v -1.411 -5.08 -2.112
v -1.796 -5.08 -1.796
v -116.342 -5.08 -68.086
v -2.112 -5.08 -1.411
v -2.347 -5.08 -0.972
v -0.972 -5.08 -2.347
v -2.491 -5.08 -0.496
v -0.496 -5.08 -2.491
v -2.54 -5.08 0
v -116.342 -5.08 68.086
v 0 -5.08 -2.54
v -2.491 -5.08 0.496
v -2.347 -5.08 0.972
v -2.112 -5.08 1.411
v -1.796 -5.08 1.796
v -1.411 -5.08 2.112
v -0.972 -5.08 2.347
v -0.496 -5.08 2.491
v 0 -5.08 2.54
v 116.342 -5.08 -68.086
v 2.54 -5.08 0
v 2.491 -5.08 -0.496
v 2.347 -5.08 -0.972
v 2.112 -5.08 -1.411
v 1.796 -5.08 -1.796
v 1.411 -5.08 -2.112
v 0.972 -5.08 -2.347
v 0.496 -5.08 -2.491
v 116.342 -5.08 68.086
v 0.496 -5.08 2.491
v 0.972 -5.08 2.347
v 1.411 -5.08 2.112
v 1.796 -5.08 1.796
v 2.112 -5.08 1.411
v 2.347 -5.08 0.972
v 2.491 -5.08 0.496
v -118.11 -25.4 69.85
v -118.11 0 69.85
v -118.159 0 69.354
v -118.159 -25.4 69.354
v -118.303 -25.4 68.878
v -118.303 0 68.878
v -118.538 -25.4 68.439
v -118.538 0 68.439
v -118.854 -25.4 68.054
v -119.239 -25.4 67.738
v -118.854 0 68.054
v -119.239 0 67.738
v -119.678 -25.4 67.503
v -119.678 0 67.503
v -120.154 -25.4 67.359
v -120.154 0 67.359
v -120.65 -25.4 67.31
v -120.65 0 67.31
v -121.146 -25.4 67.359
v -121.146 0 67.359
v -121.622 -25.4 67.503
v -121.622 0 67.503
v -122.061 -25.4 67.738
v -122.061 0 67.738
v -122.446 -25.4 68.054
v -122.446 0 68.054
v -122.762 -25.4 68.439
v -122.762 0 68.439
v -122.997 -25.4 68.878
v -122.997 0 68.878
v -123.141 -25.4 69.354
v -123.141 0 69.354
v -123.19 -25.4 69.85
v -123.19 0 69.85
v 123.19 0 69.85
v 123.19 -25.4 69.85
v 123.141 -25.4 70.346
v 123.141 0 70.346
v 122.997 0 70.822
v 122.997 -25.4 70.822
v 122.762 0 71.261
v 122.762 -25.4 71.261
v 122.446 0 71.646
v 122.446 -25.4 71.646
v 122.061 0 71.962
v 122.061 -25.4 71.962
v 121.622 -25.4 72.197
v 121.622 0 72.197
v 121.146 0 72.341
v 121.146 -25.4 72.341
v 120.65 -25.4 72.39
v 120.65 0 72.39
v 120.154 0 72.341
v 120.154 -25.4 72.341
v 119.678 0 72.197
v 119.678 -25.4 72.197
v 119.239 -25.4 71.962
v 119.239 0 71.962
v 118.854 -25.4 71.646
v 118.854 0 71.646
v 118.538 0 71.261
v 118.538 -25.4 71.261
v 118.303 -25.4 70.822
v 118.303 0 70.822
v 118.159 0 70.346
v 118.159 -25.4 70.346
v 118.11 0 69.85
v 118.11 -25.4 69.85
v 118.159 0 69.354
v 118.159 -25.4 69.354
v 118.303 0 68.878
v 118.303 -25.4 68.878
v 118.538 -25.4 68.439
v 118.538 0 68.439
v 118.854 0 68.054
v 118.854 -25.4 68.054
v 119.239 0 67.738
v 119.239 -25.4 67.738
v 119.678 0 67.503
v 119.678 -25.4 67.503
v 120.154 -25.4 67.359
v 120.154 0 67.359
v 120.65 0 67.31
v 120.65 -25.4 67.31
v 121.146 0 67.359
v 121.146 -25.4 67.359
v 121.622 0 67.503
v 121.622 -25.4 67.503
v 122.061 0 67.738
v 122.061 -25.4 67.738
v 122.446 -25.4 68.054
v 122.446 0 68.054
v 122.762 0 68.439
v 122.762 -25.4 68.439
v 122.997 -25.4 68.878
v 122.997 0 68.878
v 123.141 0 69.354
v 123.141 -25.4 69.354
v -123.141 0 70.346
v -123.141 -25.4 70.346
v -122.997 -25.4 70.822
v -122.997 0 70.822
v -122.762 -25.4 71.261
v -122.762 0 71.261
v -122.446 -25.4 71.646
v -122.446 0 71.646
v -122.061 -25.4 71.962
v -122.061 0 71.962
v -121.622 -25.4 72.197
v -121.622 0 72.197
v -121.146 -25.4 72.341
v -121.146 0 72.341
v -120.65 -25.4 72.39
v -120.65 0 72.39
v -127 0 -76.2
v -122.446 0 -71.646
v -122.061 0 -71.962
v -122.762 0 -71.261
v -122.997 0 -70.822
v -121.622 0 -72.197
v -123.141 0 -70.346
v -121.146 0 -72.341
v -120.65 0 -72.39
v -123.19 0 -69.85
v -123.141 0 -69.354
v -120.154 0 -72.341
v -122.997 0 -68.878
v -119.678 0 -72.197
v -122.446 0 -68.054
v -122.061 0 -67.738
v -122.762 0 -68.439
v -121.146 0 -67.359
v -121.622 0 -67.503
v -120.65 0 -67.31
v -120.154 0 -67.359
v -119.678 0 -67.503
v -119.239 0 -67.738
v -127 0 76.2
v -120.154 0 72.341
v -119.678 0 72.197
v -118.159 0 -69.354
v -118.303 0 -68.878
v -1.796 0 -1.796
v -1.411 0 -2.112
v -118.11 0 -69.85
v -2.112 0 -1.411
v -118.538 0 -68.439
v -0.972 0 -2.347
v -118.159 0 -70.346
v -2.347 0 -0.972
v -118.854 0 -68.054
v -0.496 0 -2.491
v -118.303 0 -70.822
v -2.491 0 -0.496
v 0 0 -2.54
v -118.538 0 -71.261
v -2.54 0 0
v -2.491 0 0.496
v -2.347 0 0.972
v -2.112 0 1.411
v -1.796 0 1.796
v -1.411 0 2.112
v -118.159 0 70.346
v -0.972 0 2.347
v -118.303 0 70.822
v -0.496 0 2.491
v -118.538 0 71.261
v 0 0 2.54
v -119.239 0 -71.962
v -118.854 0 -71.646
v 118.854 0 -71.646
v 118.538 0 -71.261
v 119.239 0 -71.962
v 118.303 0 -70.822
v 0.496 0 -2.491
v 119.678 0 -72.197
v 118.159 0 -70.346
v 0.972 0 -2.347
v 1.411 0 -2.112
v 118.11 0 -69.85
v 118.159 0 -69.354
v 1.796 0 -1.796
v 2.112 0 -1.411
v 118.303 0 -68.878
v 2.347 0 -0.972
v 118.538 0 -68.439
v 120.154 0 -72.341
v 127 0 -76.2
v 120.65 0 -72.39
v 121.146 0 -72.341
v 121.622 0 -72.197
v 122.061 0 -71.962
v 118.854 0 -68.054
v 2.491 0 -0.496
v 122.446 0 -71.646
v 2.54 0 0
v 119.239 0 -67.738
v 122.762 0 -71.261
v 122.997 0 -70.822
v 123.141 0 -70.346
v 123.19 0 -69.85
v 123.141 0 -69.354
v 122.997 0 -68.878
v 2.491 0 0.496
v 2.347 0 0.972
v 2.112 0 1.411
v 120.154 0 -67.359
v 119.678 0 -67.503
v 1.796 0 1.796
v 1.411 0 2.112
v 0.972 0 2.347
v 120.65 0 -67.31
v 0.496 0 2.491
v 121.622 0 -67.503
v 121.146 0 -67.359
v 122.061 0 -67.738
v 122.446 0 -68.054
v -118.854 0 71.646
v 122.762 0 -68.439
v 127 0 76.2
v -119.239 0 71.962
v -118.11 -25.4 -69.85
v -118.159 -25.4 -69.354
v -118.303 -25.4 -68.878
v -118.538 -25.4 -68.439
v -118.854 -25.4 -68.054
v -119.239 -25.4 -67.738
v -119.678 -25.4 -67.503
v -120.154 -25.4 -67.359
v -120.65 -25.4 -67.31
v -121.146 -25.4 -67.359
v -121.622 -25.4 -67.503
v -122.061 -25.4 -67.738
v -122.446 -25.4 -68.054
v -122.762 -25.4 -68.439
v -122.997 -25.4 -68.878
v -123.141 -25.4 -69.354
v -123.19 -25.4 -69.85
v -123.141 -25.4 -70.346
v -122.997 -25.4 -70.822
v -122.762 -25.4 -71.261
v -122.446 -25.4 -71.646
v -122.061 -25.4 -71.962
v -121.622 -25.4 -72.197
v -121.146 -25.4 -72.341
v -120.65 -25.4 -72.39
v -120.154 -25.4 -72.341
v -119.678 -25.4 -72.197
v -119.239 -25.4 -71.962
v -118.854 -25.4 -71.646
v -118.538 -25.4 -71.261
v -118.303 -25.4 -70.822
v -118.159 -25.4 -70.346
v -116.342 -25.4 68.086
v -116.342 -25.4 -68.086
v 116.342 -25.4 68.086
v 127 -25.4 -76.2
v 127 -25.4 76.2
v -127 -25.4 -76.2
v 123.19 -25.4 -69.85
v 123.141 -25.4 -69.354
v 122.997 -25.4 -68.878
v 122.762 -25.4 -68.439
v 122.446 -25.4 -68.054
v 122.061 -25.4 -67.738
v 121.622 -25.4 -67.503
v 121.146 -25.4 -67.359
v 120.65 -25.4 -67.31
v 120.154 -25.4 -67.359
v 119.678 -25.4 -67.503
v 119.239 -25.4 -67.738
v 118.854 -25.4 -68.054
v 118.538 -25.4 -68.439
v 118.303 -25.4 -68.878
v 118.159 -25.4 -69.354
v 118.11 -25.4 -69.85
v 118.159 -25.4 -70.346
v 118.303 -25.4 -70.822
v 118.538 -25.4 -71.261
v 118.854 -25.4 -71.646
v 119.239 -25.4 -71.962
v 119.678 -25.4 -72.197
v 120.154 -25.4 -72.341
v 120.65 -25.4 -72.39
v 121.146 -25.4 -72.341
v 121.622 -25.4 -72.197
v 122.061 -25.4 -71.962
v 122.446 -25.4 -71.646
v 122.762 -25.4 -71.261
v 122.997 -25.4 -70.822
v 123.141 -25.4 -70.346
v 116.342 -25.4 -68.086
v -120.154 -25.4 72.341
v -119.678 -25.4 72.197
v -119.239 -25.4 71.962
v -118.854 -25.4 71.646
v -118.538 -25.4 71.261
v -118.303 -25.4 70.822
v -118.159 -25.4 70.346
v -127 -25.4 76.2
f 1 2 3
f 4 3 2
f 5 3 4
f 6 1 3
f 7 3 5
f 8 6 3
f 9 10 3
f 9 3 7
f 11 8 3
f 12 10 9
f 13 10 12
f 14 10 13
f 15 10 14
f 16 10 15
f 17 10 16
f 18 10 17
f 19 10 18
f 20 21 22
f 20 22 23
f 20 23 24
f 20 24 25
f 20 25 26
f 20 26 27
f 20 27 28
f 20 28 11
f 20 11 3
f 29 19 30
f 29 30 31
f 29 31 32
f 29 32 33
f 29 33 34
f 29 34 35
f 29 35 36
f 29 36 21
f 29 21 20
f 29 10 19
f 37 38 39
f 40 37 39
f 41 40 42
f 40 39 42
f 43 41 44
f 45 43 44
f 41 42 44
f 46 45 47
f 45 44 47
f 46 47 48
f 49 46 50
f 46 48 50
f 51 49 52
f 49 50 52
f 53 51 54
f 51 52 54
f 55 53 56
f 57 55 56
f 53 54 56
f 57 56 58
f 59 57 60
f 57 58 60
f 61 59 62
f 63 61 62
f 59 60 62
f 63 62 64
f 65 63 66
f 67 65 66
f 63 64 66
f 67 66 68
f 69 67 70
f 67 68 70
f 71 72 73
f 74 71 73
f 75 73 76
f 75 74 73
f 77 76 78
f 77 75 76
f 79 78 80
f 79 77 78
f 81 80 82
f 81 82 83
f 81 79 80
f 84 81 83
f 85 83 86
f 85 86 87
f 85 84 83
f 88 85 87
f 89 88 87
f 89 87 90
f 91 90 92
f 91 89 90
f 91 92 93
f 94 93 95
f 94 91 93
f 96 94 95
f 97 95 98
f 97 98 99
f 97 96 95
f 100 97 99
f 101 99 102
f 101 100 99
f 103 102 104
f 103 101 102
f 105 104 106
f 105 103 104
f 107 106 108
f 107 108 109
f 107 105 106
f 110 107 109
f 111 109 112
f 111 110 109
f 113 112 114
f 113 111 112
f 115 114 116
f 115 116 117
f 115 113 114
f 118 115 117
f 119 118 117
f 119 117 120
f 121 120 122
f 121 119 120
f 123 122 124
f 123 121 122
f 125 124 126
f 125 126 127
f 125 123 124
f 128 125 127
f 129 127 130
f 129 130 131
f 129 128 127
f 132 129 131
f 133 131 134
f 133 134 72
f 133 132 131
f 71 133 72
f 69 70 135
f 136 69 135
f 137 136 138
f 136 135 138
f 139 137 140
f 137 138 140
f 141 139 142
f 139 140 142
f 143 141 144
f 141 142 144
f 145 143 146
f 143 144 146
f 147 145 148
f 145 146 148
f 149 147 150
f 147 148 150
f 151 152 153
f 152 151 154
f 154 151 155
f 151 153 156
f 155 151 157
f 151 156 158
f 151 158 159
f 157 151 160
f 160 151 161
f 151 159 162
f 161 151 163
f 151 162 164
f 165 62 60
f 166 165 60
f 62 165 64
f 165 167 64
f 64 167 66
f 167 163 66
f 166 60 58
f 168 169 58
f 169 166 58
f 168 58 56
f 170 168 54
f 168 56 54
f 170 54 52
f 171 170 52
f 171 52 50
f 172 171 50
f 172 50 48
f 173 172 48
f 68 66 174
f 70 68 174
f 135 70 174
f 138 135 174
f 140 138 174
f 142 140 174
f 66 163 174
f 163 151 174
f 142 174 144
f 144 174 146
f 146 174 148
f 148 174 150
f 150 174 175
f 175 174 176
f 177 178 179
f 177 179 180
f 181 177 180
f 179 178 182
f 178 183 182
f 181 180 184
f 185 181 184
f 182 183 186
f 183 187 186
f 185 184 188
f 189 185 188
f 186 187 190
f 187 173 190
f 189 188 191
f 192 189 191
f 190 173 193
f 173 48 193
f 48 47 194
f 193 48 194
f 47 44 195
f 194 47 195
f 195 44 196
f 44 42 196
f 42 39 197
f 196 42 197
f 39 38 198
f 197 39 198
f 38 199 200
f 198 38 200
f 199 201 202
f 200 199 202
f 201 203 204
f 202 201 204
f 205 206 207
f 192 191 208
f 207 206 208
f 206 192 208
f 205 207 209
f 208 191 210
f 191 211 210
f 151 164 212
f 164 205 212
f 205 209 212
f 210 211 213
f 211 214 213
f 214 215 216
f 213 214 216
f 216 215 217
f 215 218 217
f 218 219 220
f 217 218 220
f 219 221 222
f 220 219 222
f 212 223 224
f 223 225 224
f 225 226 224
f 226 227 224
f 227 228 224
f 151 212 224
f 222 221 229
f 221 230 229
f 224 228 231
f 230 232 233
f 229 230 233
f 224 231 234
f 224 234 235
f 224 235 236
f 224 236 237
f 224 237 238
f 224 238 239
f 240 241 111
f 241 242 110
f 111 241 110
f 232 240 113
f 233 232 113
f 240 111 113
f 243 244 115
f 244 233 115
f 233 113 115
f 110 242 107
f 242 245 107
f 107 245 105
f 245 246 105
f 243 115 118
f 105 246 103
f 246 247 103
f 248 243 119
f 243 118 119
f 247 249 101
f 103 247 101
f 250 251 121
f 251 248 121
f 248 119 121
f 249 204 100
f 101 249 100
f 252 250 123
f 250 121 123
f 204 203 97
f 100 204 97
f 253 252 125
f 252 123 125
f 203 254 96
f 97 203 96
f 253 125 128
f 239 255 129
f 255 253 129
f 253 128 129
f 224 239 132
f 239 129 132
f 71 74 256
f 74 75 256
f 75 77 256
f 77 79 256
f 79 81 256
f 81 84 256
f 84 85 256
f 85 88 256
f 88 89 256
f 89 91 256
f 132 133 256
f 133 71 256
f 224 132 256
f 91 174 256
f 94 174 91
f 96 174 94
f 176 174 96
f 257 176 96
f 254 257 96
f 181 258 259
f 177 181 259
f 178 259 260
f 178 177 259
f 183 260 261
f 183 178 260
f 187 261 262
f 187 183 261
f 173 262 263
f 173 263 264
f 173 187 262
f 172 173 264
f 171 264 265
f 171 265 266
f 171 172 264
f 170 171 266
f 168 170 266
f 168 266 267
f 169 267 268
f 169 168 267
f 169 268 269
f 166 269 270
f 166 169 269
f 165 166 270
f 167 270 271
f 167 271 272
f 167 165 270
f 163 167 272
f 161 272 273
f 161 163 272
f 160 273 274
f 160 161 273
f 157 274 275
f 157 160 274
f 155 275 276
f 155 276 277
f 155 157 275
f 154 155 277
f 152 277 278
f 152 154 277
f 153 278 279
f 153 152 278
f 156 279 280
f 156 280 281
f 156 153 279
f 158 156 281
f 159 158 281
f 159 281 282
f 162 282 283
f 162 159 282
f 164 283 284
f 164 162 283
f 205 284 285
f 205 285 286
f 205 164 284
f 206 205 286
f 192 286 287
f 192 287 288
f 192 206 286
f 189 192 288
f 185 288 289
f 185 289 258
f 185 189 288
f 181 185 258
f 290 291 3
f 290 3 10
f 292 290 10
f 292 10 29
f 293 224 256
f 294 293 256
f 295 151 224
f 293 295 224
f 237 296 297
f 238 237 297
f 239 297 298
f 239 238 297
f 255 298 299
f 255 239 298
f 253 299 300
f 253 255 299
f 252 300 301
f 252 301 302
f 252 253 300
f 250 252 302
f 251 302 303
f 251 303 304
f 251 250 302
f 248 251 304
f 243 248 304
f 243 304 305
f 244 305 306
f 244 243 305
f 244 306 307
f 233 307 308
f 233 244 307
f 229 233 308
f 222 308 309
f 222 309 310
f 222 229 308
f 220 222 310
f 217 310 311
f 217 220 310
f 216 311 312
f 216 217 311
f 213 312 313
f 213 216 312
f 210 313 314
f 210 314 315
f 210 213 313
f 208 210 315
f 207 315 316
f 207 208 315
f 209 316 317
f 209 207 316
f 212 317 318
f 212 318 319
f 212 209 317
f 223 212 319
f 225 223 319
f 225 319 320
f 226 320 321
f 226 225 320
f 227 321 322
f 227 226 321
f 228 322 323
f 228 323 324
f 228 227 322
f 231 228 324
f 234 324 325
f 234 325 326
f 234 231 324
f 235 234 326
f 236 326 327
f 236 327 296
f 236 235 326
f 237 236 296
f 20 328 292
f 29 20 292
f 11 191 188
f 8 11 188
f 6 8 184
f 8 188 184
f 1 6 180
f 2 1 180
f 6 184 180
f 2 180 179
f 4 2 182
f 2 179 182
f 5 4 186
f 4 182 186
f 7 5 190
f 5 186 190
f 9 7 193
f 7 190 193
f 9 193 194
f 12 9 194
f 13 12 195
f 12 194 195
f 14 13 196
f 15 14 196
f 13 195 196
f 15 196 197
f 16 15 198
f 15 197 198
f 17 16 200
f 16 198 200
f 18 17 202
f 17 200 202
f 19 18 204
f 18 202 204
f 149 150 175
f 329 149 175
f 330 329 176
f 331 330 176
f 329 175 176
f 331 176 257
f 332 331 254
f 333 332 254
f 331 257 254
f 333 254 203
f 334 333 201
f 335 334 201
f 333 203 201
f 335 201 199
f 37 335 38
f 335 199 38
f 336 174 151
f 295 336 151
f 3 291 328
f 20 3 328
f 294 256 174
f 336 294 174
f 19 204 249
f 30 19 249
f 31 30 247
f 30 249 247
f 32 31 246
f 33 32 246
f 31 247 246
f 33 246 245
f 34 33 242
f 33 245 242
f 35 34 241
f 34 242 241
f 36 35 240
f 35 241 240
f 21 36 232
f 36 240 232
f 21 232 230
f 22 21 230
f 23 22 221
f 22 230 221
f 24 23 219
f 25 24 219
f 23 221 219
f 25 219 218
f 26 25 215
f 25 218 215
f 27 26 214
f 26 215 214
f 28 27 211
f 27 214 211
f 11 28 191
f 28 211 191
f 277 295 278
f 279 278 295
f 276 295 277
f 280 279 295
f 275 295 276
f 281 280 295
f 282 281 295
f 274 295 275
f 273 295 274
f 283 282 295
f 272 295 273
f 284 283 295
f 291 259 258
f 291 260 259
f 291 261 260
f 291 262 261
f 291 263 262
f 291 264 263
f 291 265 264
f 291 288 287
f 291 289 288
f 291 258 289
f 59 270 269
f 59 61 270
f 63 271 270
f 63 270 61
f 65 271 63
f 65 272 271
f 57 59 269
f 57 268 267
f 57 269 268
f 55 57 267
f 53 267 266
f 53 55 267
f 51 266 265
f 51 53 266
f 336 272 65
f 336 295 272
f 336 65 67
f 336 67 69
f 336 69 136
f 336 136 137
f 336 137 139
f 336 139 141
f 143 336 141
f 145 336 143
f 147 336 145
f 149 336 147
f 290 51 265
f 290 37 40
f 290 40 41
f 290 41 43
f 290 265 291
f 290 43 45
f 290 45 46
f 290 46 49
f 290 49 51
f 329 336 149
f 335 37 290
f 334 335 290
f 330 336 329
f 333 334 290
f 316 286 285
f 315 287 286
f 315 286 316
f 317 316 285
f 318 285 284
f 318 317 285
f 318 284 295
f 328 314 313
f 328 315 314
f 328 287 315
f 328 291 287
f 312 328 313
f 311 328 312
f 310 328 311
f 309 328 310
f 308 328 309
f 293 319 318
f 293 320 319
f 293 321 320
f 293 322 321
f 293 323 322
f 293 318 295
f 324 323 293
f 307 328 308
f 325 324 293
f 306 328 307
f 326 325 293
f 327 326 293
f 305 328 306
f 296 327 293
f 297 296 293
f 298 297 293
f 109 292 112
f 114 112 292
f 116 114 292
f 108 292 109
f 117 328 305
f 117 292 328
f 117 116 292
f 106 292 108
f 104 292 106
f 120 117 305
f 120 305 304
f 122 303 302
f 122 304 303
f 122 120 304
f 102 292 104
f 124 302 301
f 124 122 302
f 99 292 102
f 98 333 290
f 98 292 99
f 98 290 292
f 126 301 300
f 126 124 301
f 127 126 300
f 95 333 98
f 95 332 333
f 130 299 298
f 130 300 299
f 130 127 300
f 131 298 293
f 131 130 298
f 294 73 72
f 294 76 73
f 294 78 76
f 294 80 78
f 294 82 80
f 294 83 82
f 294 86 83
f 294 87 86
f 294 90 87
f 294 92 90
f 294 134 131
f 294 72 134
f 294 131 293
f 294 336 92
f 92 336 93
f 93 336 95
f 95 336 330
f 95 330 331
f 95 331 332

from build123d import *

# Parameters (mm, degrees)
F0_R     = 2.54
F1_DEPTH = 25.4
F2_W     = 232.68409
F2_H     = 136.17222
F3_DEPTH = 20.32


with BuildPart() as f1:
    # F0 (on Front) → F1 (new body)
    with BuildSketch(Plane.XZ):
        with BuildLine():
            Line((0, -76.2), (127, -76.2))
            Line((127, -76.2), (127, 0))
            Line((127, 0), (2.54, 0))
            ThreePointArc((2.54, 0), (1.796051, -1.796051), (0, -2.54))
            Line((0, -2.54), (0, -76.2))
        make_face()
        with Locations((120.65, -69.85)):
            Circle(F0_R, mode=Mode.SUBTRACT)
        with BuildLine():
            Line((-127, -76.2), (0, -76.2))
            Line((0, -76.2), (0, -2.54))
            ThreePointArc((0, -2.54), (-1.796051, -1.796051), (-2.54, 0))
            Line((-2.54, 0), (-127, 0))
            Line((-127, 0), (-127, -76.2))
        make_face()
        with Locations((-120.65, -69.85)):
            Circle(F0_R, mode=Mode.SUBTRACT)
        with BuildLine():
            Line((2.54, 0), (127, 0))
            Line((127, 0), (127, 76.2))
            Line((127, 76.2), (0, 76.2))
            Line((0, 76.2), (0, 2.54))
            ThreePointArc((0, 2.54), (1.796051, 1.796051), (2.54, 0))
        make_face()
        with Locations((120.65, 69.85)):
            Circle(F0_R, mode=Mode.SUBTRACT)
        with BuildLine():
            Line((-127, 69.85), (-127, 0))
            Line((-127, 0), (-2.54, 0))
            ThreePointArc((-2.54, 0), (-1.796051, 1.796051), (0, 2.54))
            Line((0, 2.54), (0, 76.2))
            Line((0, 76.2), (-120.65, 76.2))
            Line((-120.65, 76.2), (-120.65, 72.39))
            ThreePointArc((-120.65, 72.39), (-118.853949, 71.646051), (-118.11, 69.85))
            ThreePointArc((-118.11, 69.85), (-120.65, 67.31), (-123.19, 69.85))
            Line((-123.19, 69.85), (-127, 69.85))
        make_face()
        with BuildLine():
            Line((-127, 76.2), (-127, 69.85))
            Line((-127, 69.85), (-123.19, 69.85))
            ThreePointArc((-123.19, 69.85), (-122.446051, 71.646051), (-120.65, 72.39))
            Line((-120.65, 72.39), (-120.65, 76.2))
            Line((-120.65, 76.2), (-127, 76.2))
        make_face()
    extrude(amount=F1_DEPTH)

    # F2 (on face) → F3 (cut)
    with BuildSketch(Plane.XZ.offset(25.4)):
        Rectangle(F2_W, F2_H)
    extrude(amount=-F3_DEPTH, mode=Mode.SUBTRACT)


solid = f1.part
